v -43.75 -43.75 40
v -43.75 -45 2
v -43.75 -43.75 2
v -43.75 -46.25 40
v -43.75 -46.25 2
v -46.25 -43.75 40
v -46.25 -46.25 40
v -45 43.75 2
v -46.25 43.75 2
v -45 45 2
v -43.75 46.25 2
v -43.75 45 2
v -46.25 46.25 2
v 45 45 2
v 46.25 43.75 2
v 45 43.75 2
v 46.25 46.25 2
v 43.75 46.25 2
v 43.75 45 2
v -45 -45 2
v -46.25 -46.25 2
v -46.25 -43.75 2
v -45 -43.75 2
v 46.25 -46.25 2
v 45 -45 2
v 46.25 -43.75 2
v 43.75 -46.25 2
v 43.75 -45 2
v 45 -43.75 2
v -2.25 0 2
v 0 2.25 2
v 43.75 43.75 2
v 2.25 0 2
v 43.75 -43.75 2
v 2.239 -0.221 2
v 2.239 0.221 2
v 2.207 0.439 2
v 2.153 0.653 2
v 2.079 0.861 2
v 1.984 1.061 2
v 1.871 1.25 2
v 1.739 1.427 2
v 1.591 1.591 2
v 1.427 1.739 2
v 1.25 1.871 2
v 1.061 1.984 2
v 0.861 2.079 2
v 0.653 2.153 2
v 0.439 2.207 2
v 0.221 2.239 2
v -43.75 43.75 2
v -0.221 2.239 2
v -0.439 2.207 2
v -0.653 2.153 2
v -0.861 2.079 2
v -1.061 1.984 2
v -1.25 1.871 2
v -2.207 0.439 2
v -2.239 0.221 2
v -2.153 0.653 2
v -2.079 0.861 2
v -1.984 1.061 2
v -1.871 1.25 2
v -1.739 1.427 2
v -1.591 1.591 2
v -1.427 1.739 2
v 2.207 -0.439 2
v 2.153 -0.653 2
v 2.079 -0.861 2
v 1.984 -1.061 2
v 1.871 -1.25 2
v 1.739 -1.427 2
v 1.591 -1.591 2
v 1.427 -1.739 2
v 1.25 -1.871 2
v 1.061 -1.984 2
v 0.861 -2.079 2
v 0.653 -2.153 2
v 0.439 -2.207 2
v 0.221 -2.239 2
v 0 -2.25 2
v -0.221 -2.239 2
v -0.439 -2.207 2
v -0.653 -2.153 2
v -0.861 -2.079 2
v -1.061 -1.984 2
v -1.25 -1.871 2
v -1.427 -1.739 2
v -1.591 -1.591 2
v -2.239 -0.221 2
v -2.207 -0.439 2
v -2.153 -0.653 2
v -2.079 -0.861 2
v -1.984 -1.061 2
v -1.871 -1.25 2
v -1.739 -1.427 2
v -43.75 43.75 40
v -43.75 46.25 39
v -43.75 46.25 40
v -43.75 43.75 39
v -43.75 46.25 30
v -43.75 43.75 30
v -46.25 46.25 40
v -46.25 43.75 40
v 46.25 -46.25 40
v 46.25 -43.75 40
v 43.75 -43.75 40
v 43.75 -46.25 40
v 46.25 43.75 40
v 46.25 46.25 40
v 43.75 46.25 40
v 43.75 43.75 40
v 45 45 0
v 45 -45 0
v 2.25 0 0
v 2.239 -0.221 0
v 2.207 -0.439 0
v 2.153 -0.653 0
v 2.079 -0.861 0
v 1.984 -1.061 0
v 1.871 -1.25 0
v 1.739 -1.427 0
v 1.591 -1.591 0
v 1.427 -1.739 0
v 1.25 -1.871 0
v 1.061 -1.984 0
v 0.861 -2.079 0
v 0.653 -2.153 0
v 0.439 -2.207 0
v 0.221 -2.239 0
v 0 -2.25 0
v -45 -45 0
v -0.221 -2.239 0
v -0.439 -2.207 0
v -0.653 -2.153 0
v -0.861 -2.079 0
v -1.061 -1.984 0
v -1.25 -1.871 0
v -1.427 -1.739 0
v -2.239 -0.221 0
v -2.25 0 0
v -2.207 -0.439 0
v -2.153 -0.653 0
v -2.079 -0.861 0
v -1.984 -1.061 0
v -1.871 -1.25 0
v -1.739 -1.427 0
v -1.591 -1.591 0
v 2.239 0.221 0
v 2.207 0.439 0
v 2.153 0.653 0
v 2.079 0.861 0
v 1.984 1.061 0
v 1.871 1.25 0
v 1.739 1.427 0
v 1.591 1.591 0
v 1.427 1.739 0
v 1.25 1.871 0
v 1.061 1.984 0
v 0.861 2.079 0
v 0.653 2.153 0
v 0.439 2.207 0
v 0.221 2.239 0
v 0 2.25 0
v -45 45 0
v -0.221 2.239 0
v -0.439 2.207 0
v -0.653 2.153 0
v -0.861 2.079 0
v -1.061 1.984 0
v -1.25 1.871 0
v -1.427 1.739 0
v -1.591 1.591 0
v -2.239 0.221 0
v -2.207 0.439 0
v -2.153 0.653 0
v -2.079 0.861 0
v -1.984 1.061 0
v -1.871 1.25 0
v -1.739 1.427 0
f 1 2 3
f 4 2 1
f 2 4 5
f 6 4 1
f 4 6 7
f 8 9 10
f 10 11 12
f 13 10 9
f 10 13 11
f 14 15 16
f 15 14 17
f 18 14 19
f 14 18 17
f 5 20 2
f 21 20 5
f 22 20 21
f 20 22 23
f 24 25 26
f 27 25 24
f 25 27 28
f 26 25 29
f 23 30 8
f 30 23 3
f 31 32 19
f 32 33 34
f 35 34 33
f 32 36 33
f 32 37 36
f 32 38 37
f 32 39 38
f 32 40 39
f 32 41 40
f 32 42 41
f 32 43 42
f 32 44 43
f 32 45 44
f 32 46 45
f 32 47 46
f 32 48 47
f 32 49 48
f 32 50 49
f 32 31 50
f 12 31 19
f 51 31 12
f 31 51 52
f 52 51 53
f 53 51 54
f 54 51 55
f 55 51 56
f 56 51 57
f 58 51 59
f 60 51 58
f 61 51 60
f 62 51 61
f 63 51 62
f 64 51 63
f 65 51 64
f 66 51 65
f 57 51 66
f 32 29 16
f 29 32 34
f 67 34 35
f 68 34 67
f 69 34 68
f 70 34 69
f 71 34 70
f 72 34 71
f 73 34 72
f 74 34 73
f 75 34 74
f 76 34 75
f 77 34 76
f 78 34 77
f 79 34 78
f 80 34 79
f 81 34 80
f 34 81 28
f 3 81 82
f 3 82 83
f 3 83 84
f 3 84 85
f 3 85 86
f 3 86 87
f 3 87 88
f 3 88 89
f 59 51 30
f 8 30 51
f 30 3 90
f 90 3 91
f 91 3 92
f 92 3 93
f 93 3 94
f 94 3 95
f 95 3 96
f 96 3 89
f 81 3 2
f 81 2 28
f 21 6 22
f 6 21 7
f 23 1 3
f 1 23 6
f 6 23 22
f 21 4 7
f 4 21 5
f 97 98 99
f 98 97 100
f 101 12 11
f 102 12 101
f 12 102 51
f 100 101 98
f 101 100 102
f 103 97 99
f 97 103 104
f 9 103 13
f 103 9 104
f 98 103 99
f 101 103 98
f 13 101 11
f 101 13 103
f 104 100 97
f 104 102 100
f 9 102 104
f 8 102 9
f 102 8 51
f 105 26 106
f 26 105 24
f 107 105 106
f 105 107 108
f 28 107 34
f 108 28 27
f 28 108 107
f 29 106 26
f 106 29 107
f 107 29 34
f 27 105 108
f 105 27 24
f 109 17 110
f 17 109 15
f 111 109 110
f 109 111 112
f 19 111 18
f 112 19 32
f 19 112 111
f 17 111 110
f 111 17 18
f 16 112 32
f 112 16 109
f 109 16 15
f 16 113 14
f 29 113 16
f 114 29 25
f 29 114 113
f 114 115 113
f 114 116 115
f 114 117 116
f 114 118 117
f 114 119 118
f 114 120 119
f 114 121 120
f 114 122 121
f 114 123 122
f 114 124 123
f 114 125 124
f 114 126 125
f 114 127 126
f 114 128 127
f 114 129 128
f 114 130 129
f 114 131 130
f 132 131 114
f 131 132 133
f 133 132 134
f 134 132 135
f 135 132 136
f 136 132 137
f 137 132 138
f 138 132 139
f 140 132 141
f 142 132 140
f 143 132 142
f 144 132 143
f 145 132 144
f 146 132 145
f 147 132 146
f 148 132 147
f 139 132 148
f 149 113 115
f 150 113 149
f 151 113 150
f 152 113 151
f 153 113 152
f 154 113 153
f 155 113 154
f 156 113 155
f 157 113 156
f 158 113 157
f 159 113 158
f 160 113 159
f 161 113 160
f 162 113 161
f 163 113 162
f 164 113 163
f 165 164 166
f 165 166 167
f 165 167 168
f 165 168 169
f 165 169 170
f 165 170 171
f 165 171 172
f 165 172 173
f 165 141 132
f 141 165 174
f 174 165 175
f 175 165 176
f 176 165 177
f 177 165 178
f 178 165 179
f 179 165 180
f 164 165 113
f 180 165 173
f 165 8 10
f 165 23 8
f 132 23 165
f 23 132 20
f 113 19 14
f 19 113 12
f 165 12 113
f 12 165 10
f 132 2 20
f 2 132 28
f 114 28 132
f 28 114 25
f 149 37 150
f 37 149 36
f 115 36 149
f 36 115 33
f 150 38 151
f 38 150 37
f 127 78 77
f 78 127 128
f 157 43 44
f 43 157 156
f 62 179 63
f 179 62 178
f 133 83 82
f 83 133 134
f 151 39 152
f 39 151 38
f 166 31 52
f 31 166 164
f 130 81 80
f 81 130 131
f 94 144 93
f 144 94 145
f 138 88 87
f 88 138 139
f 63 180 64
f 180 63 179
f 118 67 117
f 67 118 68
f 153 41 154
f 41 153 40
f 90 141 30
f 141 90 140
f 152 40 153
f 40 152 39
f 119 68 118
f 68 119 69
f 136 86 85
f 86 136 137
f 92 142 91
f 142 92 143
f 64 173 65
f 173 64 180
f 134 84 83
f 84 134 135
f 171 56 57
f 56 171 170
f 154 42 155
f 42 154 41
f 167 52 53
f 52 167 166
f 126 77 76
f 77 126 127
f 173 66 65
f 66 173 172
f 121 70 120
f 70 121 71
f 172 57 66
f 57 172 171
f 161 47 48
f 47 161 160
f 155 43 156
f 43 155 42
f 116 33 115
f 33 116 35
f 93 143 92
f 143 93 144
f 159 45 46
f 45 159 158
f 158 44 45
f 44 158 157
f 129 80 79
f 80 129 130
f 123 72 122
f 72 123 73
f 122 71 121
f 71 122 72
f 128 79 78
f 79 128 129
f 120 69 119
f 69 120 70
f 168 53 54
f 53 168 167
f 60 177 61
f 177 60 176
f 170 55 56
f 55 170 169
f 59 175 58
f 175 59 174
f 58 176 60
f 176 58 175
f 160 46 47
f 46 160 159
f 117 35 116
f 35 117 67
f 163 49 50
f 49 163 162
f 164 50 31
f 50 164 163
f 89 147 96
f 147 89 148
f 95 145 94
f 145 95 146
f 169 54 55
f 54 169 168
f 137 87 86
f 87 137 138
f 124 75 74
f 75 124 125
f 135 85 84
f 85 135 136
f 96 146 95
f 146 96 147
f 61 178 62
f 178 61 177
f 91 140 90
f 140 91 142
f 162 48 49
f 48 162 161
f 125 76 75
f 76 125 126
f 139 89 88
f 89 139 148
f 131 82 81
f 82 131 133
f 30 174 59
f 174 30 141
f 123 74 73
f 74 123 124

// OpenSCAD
// DIY magnetic stirrer housing - print orientation (upside down)
// Units: mm

$fn = 64;

// --- Dimensions ---
top_t      = 2;     // top plate thickness
wall_t     = 2.5;   // wall thickness
box_h      = 40;    // total height (open top at z = 40)
outer_x    = 90;    // outer size in X
outer_y    = 90;    // outer size in Y
screw_h    = 4.5;   // M4 screw hole diameter
screw_n    = 4;     // number of screw holes
screw_p    = 71.5;  // square pitch of screw holes
notch_w    = 12;    // cable notch width
notch_d    = 8;     // notch depth from open edge
eps        = 0.5;   // cutter overshoot

// --- Model ---
difference() {
    union() {
        // Top plate (on bed)
        translate([-outer_x/2, -outer_y/2, 0])
            cube([outer_x, outer_y, top_t]);

        // Four walls rising to open top
        for (x = [-outer_x/2, outer_x/2])
            for (y = [-outer_y/2, outer_y/2])
                translate([x - wall_t/2, y - wall_t/2, top_t])
                    cube([wall_t, wall_t, box_h - top_t]);
    }

    // Screw holes through top plate, centred on plate
    for (i = [0 : screw_n - 1]) {
        a = (i - screw_n/2) * screw_p;
        translate([a, a, -eps])
            cylinder(d = screw_h, h = top_t + 2*eps);
    }

    // Cable notch in one wall, centred along the wall
    translate([-outer_x/2 + wall_t/2, 0, box_h - top_t - notch_d])
        cube([notch_w, outer_y + 2*eps, notch_d + 2*eps]);
}
